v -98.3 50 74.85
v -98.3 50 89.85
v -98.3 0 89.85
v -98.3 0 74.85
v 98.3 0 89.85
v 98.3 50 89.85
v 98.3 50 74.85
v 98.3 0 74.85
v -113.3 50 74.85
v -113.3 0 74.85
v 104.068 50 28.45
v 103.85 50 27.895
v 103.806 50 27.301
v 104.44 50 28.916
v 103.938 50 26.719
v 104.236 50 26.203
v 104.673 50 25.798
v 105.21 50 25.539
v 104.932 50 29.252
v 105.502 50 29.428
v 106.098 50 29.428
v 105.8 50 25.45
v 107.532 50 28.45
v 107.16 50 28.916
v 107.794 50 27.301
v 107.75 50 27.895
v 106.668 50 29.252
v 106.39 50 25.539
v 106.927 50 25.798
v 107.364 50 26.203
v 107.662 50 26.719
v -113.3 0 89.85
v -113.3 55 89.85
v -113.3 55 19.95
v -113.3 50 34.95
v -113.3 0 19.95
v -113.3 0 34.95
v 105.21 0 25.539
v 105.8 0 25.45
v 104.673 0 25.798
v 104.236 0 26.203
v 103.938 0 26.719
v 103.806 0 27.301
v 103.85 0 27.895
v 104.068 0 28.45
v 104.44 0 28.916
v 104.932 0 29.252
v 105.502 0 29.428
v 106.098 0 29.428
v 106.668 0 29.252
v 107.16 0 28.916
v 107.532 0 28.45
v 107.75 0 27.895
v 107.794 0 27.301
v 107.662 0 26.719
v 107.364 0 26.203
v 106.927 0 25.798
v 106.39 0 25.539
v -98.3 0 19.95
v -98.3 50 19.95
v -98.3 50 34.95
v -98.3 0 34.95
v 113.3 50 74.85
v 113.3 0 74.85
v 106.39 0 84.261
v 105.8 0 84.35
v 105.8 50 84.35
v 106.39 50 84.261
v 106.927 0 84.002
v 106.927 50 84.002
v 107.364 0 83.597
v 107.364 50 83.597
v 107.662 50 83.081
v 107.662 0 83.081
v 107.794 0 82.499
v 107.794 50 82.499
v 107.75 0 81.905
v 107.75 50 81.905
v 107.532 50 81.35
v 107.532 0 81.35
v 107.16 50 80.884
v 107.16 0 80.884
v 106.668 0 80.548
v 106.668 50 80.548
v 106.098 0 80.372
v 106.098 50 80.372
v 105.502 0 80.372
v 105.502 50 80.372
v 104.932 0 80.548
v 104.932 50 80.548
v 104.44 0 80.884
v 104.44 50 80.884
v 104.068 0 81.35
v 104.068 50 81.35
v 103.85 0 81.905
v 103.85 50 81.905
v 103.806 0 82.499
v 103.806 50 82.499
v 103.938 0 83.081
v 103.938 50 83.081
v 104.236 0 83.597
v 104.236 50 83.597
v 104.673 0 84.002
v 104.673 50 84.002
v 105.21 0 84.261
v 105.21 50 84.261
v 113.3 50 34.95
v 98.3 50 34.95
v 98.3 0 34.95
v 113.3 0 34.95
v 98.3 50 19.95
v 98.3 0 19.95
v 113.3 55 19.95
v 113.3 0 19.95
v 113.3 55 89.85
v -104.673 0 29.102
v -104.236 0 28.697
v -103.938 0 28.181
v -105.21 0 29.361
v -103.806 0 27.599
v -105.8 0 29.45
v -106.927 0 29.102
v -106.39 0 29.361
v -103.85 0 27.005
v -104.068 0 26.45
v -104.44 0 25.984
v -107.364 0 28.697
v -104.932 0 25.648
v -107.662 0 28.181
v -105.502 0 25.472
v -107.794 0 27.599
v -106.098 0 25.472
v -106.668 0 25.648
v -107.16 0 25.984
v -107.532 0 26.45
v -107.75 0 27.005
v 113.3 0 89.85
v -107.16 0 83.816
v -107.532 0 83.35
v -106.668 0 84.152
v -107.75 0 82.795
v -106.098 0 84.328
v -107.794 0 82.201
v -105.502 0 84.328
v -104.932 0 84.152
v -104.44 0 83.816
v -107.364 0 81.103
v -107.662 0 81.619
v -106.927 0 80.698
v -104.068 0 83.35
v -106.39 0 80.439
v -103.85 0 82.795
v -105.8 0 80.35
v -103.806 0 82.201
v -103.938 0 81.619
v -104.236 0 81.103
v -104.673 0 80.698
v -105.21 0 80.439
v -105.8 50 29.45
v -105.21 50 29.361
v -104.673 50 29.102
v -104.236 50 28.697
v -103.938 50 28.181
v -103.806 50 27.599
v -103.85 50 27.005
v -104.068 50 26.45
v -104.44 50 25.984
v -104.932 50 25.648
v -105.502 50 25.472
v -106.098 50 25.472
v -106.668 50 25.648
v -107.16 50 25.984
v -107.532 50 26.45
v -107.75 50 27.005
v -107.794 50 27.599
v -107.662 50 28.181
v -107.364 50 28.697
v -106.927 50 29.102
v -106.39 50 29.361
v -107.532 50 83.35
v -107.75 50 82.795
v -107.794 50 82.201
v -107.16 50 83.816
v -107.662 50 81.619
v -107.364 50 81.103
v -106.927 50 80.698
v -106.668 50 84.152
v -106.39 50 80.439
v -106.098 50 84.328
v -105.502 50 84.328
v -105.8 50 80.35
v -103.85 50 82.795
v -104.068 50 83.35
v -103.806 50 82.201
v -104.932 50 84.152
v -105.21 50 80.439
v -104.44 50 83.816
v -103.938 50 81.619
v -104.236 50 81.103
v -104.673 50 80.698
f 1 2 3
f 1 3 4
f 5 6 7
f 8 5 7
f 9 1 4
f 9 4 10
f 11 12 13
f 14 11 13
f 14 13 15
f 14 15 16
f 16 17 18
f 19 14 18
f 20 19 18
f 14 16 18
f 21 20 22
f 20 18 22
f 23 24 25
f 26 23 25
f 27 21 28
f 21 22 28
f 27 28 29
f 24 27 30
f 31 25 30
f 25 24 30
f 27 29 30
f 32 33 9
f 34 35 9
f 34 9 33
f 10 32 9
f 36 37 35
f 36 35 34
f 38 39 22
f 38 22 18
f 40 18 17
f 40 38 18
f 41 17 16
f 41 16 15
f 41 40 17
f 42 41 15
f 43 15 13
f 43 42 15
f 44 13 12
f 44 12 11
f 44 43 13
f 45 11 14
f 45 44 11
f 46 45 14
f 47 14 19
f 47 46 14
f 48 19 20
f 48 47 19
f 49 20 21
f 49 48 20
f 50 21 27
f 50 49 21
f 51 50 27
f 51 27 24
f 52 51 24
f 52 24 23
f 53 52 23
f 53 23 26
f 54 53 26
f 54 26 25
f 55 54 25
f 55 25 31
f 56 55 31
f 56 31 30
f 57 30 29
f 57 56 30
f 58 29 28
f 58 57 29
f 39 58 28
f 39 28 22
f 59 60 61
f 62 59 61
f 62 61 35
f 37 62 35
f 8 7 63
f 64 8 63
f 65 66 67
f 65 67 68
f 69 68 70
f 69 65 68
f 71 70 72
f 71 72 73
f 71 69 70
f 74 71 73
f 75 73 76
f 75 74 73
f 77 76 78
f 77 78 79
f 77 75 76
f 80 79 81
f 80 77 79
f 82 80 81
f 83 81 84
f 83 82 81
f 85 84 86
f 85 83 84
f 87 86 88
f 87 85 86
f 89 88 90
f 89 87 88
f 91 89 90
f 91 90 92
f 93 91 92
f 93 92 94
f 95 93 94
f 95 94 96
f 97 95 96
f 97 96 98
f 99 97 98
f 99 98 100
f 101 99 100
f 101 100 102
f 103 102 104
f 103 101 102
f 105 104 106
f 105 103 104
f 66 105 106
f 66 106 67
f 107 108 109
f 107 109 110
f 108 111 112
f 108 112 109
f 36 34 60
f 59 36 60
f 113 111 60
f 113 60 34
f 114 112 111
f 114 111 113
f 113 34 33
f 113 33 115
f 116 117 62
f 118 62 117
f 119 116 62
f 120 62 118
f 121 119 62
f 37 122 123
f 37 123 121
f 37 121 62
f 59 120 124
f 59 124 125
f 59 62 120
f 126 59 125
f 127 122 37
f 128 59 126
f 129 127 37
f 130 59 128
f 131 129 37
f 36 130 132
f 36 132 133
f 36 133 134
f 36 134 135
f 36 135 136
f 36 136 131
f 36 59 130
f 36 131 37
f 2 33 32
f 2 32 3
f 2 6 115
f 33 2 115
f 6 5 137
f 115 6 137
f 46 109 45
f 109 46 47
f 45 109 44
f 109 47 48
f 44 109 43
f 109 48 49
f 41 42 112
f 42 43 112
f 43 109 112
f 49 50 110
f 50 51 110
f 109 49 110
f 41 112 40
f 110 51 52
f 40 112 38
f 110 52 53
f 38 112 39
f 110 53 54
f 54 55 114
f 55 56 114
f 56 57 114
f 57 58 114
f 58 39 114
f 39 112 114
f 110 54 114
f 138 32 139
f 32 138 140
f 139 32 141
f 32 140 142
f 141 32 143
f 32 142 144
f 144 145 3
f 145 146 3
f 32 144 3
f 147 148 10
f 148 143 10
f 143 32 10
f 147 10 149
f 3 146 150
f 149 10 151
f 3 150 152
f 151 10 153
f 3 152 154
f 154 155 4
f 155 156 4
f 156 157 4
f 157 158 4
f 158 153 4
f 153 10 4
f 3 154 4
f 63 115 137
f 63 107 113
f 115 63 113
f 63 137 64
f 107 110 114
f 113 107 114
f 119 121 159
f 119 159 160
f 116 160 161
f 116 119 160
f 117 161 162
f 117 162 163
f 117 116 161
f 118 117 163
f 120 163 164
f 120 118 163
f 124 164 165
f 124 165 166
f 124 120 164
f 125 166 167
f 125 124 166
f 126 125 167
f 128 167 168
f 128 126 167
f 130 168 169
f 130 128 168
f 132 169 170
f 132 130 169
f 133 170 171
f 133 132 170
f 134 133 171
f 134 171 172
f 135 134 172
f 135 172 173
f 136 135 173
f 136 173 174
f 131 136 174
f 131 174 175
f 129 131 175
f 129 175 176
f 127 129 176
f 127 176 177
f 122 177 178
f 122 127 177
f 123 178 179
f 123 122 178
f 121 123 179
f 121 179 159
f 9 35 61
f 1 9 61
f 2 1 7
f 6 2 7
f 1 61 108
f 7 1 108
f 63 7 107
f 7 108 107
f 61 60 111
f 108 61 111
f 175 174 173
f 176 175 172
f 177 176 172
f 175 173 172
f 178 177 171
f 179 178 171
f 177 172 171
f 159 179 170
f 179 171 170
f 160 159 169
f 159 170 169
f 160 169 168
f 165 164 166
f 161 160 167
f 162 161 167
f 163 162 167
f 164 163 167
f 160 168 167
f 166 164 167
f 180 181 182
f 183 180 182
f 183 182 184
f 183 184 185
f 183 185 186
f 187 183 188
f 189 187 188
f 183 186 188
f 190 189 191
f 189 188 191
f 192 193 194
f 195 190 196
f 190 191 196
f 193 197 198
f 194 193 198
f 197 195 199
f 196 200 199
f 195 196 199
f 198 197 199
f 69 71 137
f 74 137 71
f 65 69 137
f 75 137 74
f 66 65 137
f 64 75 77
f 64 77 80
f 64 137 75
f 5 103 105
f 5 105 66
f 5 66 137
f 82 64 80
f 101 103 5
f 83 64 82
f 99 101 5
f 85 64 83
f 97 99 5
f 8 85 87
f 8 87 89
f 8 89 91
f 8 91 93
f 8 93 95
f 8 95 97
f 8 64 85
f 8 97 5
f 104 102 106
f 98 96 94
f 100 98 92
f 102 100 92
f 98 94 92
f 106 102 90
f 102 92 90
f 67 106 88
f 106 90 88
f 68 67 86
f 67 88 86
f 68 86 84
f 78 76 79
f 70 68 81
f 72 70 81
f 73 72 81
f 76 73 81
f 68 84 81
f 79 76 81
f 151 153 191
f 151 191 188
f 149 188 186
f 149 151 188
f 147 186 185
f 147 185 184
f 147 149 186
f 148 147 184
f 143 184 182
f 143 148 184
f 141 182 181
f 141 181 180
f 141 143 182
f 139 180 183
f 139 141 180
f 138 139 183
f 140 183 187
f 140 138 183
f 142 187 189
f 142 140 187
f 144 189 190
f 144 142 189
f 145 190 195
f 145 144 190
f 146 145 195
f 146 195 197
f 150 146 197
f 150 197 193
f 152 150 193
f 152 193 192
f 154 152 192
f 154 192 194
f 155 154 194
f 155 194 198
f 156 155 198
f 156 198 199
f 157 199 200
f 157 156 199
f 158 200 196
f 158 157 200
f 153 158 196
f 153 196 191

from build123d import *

# Parameters (mm, degrees)
ESQUISSE1_R          = 2
BOSS_EXTRU_1_DEPTH   = 50
BOSS_EXTRU_1_2_DEPTH = 50
BOSS_EXTRU_1_3_DEPTH = 50
BOSS_EXTRU_1_4_DEPTH = 50
ESQUISSE2_W          = 226.6
ESQUISSE2_H          = 69.9
BOSS_EXTRU_2_DEPTH   = 5


with BuildPart() as part:
    # Esquisse1 → Boss.-Extru.1 (new body)
    with BuildSketch(Plane(origin=(0, 0, 0), x_dir=(1, 0, 0), z_dir=(0, 1, 0))):
        Polygon((-113.3, -27.45), (-113.3, -19.95), (-98.3, -19.95), (-98.3, -34.95), (-113.3, -34.95), align=None)
        with Locations(Location((-105.8, -27.45, 0), (0, 0, 270))):
            Circle(ESQUISSE1_R, mode=Mode.SUBTRACT)
    extrude(amount=BOSS_EXTRU_1_DEPTH)



with BuildPart() as body_2:
    # Esquisse1 → Boss.-Extru.1 2 (new body)
    with BuildSketch(Plane(origin=(0, 0, 0), x_dir=(1, 0, 0), z_dir=(0, 1, 0))):
        Polygon((-113.3, -74.85), (-113.3, -82.35), (-113.3, -89.85), (-98.3, -89.85), (-98.3, -74.85), align=None)
        with Locations(Location((-105.8, -82.35, 0), (0, 0, 90))):
            Circle(ESQUISSE1_R, mode=Mode.SUBTRACT)
    extrude(amount=BOSS_EXTRU_1_2_DEPTH)


with BuildPart() as body_3:
    # Esquisse1 → Boss.-Extru.1 3 (new body)
    with BuildSketch(Plane(origin=(0, 0, 0), x_dir=(1, 0, 0), z_dir=(0, 1, 0))):
        Polygon((98.3, -74.85), (113.3, -74.85), (113.3, -82.35), (113.3, -89.85), (98.3, -89.85), align=None)
        with Locations(Location((105.8, -82.35, 0), (0, 0, 270))):
            Circle(ESQUISSE1_R, mode=Mode.SUBTRACT)
    extrude(amount=BOSS_EXTRU_1_3_DEPTH)


with BuildPart() as body_4:
    # Esquisse1 → Boss.-Extru.1 4 (new body)
    with BuildSketch(Plane(origin=(0, 0, 0), x_dir=(1, 0, 0), z_dir=(0, 1, 0))):
        Polygon((113.3, -34.95), (113.3, -27.45), (113.3, -19.95), (98.3, -19.95), (98.3, -34.95), align=None)
        with Locations(Location((105.8, -27.45, 0), (0, 0, 90))):
            Circle(ESQUISSE1_R, mode=Mode.SUBTRACT)
    extrude(amount=BOSS_EXTRU_1_4_DEPTH)


with BuildPart() as part_1:
    add(part.part)

    add(body_2.part)  # Boss.-Extru.2 merges body 2

    add(body_3.part)  # Boss.-Extru.2 merges body 3

    add(body_4.part)  # Boss.-Extru.2 merges body 4
    # Esquisse2 → Boss.-Extru.2 (add)
    with BuildSketch(Plane(origin=(0, 50, 0), x_dir=(1, 0, 0), z_dir=(0, 1, 0))):
        with Locations((0, -54.9)):
            Rectangle(ESQUISSE2_W, ESQUISSE2_H)
    extrude(amount=BOSS_EXTRU_2_DEPTH)


solid = part_1.part
